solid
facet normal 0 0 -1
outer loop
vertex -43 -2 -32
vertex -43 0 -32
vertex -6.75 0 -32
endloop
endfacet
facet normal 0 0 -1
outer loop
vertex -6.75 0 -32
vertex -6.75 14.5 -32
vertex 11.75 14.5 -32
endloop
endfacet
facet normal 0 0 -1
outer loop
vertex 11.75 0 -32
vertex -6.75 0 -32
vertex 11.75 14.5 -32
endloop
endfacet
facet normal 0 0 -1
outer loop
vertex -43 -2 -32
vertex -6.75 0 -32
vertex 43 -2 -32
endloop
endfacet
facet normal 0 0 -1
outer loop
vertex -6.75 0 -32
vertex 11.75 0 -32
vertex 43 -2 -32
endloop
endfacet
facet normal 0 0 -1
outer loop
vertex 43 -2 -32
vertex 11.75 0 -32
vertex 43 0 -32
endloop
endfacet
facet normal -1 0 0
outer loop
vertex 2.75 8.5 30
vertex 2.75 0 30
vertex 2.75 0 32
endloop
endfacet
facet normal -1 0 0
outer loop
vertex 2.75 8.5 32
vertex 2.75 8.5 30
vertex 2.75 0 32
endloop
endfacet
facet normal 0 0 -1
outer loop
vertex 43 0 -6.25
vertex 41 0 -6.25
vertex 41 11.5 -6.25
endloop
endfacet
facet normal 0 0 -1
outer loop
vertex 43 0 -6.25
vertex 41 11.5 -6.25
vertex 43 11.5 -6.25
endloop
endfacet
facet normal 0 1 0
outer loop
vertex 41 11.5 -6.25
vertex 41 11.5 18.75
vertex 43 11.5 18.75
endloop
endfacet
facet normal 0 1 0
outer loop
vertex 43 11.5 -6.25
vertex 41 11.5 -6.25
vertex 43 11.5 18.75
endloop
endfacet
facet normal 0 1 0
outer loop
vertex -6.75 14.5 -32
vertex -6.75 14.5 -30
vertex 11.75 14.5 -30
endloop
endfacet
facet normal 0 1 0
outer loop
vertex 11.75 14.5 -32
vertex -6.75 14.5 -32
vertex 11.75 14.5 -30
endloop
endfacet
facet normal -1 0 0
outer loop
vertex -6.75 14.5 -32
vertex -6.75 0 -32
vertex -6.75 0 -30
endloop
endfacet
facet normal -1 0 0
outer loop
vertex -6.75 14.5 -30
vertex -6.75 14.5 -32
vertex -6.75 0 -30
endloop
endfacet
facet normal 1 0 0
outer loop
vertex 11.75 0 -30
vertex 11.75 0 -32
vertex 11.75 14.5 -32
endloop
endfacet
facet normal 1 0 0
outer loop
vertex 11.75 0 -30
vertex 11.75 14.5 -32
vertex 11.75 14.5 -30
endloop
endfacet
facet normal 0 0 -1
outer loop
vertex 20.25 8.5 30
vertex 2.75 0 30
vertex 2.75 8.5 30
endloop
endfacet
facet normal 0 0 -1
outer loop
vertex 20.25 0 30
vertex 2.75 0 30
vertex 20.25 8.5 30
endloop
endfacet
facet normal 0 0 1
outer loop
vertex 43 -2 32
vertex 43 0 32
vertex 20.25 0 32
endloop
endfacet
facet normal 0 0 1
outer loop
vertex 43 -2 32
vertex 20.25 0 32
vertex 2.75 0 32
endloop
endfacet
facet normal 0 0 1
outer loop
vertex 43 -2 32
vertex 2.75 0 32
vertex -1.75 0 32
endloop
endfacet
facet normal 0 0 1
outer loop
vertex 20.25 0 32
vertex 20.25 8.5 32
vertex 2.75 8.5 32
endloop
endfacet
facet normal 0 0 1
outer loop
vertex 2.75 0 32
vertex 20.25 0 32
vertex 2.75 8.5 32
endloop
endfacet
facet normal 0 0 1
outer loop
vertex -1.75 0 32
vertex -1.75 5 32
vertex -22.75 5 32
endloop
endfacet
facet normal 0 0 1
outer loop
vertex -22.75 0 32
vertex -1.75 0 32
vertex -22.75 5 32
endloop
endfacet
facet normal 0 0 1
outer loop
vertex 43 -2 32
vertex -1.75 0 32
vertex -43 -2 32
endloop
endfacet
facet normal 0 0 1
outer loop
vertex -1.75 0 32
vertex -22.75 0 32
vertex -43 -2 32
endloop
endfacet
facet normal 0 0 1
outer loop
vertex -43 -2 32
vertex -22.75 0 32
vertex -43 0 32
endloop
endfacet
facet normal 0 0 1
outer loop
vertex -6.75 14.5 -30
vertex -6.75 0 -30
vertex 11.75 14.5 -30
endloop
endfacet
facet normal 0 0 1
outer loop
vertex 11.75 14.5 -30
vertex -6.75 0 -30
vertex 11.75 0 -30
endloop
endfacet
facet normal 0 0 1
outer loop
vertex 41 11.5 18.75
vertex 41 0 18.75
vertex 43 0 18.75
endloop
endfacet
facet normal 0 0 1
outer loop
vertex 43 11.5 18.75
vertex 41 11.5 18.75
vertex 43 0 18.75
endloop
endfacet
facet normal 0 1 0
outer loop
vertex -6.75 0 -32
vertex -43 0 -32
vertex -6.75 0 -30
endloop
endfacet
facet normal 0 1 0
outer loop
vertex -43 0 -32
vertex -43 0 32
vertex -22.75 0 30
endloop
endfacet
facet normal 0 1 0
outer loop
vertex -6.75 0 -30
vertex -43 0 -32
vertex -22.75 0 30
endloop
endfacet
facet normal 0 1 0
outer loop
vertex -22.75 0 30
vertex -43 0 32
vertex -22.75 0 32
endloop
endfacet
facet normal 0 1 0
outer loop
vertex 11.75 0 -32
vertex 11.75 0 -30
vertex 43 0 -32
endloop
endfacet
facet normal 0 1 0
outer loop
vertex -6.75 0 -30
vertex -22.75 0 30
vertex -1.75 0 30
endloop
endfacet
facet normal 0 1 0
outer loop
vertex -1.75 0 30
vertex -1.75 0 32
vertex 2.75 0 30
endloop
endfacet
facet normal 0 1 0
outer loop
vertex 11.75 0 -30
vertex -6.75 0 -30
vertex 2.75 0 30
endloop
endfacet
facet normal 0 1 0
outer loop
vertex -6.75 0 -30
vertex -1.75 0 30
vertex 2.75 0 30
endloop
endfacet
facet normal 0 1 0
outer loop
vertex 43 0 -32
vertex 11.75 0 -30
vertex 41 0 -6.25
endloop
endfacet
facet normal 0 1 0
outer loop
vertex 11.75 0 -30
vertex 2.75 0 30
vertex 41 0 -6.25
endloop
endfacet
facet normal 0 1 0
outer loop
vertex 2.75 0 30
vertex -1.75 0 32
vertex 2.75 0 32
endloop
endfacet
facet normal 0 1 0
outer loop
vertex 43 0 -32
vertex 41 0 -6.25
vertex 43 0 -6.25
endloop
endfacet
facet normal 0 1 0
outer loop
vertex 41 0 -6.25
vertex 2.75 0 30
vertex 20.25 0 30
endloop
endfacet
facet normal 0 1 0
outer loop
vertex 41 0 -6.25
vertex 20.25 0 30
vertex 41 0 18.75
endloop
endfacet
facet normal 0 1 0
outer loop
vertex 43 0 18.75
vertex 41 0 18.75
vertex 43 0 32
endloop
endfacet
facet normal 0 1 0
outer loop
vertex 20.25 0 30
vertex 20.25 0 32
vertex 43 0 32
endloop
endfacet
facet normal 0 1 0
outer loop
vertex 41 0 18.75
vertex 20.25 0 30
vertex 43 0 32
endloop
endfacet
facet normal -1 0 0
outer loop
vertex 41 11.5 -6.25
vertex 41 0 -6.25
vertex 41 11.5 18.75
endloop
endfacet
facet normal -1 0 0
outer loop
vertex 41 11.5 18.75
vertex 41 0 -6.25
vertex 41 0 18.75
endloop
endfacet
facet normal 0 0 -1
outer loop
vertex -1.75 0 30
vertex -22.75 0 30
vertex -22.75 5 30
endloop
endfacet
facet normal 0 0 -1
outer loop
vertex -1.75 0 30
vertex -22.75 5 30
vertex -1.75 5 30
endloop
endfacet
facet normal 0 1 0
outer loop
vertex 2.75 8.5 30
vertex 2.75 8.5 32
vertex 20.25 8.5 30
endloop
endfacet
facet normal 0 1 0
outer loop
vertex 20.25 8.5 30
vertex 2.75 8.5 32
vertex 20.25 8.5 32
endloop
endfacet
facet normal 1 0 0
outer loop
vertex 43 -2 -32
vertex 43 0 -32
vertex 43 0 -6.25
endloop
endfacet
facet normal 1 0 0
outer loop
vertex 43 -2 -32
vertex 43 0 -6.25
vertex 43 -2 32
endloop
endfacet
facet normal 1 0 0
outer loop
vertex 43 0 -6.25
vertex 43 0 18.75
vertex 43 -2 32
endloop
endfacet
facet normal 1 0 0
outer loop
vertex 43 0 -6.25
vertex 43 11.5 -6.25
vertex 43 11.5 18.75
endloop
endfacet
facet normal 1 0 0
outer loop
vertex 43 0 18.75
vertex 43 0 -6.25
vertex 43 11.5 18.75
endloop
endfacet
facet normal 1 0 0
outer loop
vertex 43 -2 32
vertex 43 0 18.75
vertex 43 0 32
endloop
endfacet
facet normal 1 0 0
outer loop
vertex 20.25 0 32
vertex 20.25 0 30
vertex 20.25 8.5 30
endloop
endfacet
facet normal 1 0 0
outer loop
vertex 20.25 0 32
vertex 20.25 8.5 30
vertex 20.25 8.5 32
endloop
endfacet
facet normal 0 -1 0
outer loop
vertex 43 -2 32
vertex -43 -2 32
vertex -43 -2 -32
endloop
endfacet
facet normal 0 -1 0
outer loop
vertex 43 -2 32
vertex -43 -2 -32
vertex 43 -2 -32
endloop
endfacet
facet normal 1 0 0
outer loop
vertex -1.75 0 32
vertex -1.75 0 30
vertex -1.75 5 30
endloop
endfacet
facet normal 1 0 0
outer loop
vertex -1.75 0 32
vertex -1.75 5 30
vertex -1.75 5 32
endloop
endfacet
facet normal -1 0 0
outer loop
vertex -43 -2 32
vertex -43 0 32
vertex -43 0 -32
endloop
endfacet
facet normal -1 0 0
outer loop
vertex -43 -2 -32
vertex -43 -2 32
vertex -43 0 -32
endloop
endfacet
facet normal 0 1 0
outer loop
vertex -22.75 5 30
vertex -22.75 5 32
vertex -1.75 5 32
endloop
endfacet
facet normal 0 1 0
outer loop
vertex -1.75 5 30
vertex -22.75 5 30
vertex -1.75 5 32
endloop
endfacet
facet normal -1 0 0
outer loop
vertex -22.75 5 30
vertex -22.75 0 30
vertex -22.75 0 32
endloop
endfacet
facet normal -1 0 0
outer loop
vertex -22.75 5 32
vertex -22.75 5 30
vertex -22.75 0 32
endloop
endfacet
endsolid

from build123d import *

# Parameters (mm, degrees)
F0_W     = 17.5
F0_H     = 2
F0_W_2   = 18.5
F0_W_3   = 4.5
F0_W_4   = 2
F0_H_2   = 25
F0_W_5   = 21
F1_DEPTH = 2
F2_DEPTH = 14.5
F3_DEPTH = 11.5
F4_DEPTH = 8.5
F5_DEPTH = 5


with BuildPart() as f1:
    # F0 (on Front) → F1 (new body)
    with BuildSketch(Plane.XZ):
        with Locations((11.5, 31)):
            Rectangle(F0_W, F0_H)
        with Locations((2.5, -31)):
            Rectangle(F0_W_2, F0_H)
        Polygon((43, 18.75), (43, 32), (20.25, 32), (20.25, 30), (41, 30), (41, 18.75), align=None)
        with Locations((0.5, 31)):
            Rectangle(F0_W_3, F0_H)
        with Locations((42, 6.25)):
            Rectangle(F0_W_4, F0_H_2)
        Polygon((43, -32), (43, -6.25), (41, -6.25), (41, -30), (11.75, -30), (11.75, -32), align=None)
        with Locations((-12.25, 31)):
            Rectangle(F0_W_5, F0_H)
        Polygon((-22.75, 30), (-22.75, 32), (-43, 32), (-43, -32), (-6.75, -32), (-6.75, -30), (-41, -30), (-41, 30), align=None)
        Polygon((41, 30), (20.25, 30), (2.75, 30), (-1.75, 30), (-22.75, 30), (-41, 30), (-41, -30), (-6.75, -30), (11.75, -30), (41, -30), (41, -6.25), (41, 18.75), align=None)
    extrude(amount=F1_DEPTH)

    # F0 (on Front) → F2 (join)
    with BuildSketch(Plane.XZ):
        with Locations((2.5, -31)):
            Rectangle(F0_W_2, F0_H)
    extrude(amount=-F2_DEPTH)

    # F0 (on Front) → F3 (join)
    with BuildSketch(Plane.XZ):
        with Locations((42, 6.25)):
            Rectangle(F0_W_4, F0_H_2)
    extrude(amount=-F3_DEPTH)

    # F0 (on Front) → F4 (join)
    with BuildSketch(Plane.XZ):
        with Locations((11.5, 31)):
            Rectangle(F0_W, F0_H)
    extrude(amount=-F4_DEPTH)

    # F0 (on Front) → F5 (join)
    with BuildSketch(Plane.XZ):
        with Locations((-12.25, 31)):
            Rectangle(F0_W_5, F0_H)
    extrude(amount=-F5_DEPTH)


solid = f1.part
